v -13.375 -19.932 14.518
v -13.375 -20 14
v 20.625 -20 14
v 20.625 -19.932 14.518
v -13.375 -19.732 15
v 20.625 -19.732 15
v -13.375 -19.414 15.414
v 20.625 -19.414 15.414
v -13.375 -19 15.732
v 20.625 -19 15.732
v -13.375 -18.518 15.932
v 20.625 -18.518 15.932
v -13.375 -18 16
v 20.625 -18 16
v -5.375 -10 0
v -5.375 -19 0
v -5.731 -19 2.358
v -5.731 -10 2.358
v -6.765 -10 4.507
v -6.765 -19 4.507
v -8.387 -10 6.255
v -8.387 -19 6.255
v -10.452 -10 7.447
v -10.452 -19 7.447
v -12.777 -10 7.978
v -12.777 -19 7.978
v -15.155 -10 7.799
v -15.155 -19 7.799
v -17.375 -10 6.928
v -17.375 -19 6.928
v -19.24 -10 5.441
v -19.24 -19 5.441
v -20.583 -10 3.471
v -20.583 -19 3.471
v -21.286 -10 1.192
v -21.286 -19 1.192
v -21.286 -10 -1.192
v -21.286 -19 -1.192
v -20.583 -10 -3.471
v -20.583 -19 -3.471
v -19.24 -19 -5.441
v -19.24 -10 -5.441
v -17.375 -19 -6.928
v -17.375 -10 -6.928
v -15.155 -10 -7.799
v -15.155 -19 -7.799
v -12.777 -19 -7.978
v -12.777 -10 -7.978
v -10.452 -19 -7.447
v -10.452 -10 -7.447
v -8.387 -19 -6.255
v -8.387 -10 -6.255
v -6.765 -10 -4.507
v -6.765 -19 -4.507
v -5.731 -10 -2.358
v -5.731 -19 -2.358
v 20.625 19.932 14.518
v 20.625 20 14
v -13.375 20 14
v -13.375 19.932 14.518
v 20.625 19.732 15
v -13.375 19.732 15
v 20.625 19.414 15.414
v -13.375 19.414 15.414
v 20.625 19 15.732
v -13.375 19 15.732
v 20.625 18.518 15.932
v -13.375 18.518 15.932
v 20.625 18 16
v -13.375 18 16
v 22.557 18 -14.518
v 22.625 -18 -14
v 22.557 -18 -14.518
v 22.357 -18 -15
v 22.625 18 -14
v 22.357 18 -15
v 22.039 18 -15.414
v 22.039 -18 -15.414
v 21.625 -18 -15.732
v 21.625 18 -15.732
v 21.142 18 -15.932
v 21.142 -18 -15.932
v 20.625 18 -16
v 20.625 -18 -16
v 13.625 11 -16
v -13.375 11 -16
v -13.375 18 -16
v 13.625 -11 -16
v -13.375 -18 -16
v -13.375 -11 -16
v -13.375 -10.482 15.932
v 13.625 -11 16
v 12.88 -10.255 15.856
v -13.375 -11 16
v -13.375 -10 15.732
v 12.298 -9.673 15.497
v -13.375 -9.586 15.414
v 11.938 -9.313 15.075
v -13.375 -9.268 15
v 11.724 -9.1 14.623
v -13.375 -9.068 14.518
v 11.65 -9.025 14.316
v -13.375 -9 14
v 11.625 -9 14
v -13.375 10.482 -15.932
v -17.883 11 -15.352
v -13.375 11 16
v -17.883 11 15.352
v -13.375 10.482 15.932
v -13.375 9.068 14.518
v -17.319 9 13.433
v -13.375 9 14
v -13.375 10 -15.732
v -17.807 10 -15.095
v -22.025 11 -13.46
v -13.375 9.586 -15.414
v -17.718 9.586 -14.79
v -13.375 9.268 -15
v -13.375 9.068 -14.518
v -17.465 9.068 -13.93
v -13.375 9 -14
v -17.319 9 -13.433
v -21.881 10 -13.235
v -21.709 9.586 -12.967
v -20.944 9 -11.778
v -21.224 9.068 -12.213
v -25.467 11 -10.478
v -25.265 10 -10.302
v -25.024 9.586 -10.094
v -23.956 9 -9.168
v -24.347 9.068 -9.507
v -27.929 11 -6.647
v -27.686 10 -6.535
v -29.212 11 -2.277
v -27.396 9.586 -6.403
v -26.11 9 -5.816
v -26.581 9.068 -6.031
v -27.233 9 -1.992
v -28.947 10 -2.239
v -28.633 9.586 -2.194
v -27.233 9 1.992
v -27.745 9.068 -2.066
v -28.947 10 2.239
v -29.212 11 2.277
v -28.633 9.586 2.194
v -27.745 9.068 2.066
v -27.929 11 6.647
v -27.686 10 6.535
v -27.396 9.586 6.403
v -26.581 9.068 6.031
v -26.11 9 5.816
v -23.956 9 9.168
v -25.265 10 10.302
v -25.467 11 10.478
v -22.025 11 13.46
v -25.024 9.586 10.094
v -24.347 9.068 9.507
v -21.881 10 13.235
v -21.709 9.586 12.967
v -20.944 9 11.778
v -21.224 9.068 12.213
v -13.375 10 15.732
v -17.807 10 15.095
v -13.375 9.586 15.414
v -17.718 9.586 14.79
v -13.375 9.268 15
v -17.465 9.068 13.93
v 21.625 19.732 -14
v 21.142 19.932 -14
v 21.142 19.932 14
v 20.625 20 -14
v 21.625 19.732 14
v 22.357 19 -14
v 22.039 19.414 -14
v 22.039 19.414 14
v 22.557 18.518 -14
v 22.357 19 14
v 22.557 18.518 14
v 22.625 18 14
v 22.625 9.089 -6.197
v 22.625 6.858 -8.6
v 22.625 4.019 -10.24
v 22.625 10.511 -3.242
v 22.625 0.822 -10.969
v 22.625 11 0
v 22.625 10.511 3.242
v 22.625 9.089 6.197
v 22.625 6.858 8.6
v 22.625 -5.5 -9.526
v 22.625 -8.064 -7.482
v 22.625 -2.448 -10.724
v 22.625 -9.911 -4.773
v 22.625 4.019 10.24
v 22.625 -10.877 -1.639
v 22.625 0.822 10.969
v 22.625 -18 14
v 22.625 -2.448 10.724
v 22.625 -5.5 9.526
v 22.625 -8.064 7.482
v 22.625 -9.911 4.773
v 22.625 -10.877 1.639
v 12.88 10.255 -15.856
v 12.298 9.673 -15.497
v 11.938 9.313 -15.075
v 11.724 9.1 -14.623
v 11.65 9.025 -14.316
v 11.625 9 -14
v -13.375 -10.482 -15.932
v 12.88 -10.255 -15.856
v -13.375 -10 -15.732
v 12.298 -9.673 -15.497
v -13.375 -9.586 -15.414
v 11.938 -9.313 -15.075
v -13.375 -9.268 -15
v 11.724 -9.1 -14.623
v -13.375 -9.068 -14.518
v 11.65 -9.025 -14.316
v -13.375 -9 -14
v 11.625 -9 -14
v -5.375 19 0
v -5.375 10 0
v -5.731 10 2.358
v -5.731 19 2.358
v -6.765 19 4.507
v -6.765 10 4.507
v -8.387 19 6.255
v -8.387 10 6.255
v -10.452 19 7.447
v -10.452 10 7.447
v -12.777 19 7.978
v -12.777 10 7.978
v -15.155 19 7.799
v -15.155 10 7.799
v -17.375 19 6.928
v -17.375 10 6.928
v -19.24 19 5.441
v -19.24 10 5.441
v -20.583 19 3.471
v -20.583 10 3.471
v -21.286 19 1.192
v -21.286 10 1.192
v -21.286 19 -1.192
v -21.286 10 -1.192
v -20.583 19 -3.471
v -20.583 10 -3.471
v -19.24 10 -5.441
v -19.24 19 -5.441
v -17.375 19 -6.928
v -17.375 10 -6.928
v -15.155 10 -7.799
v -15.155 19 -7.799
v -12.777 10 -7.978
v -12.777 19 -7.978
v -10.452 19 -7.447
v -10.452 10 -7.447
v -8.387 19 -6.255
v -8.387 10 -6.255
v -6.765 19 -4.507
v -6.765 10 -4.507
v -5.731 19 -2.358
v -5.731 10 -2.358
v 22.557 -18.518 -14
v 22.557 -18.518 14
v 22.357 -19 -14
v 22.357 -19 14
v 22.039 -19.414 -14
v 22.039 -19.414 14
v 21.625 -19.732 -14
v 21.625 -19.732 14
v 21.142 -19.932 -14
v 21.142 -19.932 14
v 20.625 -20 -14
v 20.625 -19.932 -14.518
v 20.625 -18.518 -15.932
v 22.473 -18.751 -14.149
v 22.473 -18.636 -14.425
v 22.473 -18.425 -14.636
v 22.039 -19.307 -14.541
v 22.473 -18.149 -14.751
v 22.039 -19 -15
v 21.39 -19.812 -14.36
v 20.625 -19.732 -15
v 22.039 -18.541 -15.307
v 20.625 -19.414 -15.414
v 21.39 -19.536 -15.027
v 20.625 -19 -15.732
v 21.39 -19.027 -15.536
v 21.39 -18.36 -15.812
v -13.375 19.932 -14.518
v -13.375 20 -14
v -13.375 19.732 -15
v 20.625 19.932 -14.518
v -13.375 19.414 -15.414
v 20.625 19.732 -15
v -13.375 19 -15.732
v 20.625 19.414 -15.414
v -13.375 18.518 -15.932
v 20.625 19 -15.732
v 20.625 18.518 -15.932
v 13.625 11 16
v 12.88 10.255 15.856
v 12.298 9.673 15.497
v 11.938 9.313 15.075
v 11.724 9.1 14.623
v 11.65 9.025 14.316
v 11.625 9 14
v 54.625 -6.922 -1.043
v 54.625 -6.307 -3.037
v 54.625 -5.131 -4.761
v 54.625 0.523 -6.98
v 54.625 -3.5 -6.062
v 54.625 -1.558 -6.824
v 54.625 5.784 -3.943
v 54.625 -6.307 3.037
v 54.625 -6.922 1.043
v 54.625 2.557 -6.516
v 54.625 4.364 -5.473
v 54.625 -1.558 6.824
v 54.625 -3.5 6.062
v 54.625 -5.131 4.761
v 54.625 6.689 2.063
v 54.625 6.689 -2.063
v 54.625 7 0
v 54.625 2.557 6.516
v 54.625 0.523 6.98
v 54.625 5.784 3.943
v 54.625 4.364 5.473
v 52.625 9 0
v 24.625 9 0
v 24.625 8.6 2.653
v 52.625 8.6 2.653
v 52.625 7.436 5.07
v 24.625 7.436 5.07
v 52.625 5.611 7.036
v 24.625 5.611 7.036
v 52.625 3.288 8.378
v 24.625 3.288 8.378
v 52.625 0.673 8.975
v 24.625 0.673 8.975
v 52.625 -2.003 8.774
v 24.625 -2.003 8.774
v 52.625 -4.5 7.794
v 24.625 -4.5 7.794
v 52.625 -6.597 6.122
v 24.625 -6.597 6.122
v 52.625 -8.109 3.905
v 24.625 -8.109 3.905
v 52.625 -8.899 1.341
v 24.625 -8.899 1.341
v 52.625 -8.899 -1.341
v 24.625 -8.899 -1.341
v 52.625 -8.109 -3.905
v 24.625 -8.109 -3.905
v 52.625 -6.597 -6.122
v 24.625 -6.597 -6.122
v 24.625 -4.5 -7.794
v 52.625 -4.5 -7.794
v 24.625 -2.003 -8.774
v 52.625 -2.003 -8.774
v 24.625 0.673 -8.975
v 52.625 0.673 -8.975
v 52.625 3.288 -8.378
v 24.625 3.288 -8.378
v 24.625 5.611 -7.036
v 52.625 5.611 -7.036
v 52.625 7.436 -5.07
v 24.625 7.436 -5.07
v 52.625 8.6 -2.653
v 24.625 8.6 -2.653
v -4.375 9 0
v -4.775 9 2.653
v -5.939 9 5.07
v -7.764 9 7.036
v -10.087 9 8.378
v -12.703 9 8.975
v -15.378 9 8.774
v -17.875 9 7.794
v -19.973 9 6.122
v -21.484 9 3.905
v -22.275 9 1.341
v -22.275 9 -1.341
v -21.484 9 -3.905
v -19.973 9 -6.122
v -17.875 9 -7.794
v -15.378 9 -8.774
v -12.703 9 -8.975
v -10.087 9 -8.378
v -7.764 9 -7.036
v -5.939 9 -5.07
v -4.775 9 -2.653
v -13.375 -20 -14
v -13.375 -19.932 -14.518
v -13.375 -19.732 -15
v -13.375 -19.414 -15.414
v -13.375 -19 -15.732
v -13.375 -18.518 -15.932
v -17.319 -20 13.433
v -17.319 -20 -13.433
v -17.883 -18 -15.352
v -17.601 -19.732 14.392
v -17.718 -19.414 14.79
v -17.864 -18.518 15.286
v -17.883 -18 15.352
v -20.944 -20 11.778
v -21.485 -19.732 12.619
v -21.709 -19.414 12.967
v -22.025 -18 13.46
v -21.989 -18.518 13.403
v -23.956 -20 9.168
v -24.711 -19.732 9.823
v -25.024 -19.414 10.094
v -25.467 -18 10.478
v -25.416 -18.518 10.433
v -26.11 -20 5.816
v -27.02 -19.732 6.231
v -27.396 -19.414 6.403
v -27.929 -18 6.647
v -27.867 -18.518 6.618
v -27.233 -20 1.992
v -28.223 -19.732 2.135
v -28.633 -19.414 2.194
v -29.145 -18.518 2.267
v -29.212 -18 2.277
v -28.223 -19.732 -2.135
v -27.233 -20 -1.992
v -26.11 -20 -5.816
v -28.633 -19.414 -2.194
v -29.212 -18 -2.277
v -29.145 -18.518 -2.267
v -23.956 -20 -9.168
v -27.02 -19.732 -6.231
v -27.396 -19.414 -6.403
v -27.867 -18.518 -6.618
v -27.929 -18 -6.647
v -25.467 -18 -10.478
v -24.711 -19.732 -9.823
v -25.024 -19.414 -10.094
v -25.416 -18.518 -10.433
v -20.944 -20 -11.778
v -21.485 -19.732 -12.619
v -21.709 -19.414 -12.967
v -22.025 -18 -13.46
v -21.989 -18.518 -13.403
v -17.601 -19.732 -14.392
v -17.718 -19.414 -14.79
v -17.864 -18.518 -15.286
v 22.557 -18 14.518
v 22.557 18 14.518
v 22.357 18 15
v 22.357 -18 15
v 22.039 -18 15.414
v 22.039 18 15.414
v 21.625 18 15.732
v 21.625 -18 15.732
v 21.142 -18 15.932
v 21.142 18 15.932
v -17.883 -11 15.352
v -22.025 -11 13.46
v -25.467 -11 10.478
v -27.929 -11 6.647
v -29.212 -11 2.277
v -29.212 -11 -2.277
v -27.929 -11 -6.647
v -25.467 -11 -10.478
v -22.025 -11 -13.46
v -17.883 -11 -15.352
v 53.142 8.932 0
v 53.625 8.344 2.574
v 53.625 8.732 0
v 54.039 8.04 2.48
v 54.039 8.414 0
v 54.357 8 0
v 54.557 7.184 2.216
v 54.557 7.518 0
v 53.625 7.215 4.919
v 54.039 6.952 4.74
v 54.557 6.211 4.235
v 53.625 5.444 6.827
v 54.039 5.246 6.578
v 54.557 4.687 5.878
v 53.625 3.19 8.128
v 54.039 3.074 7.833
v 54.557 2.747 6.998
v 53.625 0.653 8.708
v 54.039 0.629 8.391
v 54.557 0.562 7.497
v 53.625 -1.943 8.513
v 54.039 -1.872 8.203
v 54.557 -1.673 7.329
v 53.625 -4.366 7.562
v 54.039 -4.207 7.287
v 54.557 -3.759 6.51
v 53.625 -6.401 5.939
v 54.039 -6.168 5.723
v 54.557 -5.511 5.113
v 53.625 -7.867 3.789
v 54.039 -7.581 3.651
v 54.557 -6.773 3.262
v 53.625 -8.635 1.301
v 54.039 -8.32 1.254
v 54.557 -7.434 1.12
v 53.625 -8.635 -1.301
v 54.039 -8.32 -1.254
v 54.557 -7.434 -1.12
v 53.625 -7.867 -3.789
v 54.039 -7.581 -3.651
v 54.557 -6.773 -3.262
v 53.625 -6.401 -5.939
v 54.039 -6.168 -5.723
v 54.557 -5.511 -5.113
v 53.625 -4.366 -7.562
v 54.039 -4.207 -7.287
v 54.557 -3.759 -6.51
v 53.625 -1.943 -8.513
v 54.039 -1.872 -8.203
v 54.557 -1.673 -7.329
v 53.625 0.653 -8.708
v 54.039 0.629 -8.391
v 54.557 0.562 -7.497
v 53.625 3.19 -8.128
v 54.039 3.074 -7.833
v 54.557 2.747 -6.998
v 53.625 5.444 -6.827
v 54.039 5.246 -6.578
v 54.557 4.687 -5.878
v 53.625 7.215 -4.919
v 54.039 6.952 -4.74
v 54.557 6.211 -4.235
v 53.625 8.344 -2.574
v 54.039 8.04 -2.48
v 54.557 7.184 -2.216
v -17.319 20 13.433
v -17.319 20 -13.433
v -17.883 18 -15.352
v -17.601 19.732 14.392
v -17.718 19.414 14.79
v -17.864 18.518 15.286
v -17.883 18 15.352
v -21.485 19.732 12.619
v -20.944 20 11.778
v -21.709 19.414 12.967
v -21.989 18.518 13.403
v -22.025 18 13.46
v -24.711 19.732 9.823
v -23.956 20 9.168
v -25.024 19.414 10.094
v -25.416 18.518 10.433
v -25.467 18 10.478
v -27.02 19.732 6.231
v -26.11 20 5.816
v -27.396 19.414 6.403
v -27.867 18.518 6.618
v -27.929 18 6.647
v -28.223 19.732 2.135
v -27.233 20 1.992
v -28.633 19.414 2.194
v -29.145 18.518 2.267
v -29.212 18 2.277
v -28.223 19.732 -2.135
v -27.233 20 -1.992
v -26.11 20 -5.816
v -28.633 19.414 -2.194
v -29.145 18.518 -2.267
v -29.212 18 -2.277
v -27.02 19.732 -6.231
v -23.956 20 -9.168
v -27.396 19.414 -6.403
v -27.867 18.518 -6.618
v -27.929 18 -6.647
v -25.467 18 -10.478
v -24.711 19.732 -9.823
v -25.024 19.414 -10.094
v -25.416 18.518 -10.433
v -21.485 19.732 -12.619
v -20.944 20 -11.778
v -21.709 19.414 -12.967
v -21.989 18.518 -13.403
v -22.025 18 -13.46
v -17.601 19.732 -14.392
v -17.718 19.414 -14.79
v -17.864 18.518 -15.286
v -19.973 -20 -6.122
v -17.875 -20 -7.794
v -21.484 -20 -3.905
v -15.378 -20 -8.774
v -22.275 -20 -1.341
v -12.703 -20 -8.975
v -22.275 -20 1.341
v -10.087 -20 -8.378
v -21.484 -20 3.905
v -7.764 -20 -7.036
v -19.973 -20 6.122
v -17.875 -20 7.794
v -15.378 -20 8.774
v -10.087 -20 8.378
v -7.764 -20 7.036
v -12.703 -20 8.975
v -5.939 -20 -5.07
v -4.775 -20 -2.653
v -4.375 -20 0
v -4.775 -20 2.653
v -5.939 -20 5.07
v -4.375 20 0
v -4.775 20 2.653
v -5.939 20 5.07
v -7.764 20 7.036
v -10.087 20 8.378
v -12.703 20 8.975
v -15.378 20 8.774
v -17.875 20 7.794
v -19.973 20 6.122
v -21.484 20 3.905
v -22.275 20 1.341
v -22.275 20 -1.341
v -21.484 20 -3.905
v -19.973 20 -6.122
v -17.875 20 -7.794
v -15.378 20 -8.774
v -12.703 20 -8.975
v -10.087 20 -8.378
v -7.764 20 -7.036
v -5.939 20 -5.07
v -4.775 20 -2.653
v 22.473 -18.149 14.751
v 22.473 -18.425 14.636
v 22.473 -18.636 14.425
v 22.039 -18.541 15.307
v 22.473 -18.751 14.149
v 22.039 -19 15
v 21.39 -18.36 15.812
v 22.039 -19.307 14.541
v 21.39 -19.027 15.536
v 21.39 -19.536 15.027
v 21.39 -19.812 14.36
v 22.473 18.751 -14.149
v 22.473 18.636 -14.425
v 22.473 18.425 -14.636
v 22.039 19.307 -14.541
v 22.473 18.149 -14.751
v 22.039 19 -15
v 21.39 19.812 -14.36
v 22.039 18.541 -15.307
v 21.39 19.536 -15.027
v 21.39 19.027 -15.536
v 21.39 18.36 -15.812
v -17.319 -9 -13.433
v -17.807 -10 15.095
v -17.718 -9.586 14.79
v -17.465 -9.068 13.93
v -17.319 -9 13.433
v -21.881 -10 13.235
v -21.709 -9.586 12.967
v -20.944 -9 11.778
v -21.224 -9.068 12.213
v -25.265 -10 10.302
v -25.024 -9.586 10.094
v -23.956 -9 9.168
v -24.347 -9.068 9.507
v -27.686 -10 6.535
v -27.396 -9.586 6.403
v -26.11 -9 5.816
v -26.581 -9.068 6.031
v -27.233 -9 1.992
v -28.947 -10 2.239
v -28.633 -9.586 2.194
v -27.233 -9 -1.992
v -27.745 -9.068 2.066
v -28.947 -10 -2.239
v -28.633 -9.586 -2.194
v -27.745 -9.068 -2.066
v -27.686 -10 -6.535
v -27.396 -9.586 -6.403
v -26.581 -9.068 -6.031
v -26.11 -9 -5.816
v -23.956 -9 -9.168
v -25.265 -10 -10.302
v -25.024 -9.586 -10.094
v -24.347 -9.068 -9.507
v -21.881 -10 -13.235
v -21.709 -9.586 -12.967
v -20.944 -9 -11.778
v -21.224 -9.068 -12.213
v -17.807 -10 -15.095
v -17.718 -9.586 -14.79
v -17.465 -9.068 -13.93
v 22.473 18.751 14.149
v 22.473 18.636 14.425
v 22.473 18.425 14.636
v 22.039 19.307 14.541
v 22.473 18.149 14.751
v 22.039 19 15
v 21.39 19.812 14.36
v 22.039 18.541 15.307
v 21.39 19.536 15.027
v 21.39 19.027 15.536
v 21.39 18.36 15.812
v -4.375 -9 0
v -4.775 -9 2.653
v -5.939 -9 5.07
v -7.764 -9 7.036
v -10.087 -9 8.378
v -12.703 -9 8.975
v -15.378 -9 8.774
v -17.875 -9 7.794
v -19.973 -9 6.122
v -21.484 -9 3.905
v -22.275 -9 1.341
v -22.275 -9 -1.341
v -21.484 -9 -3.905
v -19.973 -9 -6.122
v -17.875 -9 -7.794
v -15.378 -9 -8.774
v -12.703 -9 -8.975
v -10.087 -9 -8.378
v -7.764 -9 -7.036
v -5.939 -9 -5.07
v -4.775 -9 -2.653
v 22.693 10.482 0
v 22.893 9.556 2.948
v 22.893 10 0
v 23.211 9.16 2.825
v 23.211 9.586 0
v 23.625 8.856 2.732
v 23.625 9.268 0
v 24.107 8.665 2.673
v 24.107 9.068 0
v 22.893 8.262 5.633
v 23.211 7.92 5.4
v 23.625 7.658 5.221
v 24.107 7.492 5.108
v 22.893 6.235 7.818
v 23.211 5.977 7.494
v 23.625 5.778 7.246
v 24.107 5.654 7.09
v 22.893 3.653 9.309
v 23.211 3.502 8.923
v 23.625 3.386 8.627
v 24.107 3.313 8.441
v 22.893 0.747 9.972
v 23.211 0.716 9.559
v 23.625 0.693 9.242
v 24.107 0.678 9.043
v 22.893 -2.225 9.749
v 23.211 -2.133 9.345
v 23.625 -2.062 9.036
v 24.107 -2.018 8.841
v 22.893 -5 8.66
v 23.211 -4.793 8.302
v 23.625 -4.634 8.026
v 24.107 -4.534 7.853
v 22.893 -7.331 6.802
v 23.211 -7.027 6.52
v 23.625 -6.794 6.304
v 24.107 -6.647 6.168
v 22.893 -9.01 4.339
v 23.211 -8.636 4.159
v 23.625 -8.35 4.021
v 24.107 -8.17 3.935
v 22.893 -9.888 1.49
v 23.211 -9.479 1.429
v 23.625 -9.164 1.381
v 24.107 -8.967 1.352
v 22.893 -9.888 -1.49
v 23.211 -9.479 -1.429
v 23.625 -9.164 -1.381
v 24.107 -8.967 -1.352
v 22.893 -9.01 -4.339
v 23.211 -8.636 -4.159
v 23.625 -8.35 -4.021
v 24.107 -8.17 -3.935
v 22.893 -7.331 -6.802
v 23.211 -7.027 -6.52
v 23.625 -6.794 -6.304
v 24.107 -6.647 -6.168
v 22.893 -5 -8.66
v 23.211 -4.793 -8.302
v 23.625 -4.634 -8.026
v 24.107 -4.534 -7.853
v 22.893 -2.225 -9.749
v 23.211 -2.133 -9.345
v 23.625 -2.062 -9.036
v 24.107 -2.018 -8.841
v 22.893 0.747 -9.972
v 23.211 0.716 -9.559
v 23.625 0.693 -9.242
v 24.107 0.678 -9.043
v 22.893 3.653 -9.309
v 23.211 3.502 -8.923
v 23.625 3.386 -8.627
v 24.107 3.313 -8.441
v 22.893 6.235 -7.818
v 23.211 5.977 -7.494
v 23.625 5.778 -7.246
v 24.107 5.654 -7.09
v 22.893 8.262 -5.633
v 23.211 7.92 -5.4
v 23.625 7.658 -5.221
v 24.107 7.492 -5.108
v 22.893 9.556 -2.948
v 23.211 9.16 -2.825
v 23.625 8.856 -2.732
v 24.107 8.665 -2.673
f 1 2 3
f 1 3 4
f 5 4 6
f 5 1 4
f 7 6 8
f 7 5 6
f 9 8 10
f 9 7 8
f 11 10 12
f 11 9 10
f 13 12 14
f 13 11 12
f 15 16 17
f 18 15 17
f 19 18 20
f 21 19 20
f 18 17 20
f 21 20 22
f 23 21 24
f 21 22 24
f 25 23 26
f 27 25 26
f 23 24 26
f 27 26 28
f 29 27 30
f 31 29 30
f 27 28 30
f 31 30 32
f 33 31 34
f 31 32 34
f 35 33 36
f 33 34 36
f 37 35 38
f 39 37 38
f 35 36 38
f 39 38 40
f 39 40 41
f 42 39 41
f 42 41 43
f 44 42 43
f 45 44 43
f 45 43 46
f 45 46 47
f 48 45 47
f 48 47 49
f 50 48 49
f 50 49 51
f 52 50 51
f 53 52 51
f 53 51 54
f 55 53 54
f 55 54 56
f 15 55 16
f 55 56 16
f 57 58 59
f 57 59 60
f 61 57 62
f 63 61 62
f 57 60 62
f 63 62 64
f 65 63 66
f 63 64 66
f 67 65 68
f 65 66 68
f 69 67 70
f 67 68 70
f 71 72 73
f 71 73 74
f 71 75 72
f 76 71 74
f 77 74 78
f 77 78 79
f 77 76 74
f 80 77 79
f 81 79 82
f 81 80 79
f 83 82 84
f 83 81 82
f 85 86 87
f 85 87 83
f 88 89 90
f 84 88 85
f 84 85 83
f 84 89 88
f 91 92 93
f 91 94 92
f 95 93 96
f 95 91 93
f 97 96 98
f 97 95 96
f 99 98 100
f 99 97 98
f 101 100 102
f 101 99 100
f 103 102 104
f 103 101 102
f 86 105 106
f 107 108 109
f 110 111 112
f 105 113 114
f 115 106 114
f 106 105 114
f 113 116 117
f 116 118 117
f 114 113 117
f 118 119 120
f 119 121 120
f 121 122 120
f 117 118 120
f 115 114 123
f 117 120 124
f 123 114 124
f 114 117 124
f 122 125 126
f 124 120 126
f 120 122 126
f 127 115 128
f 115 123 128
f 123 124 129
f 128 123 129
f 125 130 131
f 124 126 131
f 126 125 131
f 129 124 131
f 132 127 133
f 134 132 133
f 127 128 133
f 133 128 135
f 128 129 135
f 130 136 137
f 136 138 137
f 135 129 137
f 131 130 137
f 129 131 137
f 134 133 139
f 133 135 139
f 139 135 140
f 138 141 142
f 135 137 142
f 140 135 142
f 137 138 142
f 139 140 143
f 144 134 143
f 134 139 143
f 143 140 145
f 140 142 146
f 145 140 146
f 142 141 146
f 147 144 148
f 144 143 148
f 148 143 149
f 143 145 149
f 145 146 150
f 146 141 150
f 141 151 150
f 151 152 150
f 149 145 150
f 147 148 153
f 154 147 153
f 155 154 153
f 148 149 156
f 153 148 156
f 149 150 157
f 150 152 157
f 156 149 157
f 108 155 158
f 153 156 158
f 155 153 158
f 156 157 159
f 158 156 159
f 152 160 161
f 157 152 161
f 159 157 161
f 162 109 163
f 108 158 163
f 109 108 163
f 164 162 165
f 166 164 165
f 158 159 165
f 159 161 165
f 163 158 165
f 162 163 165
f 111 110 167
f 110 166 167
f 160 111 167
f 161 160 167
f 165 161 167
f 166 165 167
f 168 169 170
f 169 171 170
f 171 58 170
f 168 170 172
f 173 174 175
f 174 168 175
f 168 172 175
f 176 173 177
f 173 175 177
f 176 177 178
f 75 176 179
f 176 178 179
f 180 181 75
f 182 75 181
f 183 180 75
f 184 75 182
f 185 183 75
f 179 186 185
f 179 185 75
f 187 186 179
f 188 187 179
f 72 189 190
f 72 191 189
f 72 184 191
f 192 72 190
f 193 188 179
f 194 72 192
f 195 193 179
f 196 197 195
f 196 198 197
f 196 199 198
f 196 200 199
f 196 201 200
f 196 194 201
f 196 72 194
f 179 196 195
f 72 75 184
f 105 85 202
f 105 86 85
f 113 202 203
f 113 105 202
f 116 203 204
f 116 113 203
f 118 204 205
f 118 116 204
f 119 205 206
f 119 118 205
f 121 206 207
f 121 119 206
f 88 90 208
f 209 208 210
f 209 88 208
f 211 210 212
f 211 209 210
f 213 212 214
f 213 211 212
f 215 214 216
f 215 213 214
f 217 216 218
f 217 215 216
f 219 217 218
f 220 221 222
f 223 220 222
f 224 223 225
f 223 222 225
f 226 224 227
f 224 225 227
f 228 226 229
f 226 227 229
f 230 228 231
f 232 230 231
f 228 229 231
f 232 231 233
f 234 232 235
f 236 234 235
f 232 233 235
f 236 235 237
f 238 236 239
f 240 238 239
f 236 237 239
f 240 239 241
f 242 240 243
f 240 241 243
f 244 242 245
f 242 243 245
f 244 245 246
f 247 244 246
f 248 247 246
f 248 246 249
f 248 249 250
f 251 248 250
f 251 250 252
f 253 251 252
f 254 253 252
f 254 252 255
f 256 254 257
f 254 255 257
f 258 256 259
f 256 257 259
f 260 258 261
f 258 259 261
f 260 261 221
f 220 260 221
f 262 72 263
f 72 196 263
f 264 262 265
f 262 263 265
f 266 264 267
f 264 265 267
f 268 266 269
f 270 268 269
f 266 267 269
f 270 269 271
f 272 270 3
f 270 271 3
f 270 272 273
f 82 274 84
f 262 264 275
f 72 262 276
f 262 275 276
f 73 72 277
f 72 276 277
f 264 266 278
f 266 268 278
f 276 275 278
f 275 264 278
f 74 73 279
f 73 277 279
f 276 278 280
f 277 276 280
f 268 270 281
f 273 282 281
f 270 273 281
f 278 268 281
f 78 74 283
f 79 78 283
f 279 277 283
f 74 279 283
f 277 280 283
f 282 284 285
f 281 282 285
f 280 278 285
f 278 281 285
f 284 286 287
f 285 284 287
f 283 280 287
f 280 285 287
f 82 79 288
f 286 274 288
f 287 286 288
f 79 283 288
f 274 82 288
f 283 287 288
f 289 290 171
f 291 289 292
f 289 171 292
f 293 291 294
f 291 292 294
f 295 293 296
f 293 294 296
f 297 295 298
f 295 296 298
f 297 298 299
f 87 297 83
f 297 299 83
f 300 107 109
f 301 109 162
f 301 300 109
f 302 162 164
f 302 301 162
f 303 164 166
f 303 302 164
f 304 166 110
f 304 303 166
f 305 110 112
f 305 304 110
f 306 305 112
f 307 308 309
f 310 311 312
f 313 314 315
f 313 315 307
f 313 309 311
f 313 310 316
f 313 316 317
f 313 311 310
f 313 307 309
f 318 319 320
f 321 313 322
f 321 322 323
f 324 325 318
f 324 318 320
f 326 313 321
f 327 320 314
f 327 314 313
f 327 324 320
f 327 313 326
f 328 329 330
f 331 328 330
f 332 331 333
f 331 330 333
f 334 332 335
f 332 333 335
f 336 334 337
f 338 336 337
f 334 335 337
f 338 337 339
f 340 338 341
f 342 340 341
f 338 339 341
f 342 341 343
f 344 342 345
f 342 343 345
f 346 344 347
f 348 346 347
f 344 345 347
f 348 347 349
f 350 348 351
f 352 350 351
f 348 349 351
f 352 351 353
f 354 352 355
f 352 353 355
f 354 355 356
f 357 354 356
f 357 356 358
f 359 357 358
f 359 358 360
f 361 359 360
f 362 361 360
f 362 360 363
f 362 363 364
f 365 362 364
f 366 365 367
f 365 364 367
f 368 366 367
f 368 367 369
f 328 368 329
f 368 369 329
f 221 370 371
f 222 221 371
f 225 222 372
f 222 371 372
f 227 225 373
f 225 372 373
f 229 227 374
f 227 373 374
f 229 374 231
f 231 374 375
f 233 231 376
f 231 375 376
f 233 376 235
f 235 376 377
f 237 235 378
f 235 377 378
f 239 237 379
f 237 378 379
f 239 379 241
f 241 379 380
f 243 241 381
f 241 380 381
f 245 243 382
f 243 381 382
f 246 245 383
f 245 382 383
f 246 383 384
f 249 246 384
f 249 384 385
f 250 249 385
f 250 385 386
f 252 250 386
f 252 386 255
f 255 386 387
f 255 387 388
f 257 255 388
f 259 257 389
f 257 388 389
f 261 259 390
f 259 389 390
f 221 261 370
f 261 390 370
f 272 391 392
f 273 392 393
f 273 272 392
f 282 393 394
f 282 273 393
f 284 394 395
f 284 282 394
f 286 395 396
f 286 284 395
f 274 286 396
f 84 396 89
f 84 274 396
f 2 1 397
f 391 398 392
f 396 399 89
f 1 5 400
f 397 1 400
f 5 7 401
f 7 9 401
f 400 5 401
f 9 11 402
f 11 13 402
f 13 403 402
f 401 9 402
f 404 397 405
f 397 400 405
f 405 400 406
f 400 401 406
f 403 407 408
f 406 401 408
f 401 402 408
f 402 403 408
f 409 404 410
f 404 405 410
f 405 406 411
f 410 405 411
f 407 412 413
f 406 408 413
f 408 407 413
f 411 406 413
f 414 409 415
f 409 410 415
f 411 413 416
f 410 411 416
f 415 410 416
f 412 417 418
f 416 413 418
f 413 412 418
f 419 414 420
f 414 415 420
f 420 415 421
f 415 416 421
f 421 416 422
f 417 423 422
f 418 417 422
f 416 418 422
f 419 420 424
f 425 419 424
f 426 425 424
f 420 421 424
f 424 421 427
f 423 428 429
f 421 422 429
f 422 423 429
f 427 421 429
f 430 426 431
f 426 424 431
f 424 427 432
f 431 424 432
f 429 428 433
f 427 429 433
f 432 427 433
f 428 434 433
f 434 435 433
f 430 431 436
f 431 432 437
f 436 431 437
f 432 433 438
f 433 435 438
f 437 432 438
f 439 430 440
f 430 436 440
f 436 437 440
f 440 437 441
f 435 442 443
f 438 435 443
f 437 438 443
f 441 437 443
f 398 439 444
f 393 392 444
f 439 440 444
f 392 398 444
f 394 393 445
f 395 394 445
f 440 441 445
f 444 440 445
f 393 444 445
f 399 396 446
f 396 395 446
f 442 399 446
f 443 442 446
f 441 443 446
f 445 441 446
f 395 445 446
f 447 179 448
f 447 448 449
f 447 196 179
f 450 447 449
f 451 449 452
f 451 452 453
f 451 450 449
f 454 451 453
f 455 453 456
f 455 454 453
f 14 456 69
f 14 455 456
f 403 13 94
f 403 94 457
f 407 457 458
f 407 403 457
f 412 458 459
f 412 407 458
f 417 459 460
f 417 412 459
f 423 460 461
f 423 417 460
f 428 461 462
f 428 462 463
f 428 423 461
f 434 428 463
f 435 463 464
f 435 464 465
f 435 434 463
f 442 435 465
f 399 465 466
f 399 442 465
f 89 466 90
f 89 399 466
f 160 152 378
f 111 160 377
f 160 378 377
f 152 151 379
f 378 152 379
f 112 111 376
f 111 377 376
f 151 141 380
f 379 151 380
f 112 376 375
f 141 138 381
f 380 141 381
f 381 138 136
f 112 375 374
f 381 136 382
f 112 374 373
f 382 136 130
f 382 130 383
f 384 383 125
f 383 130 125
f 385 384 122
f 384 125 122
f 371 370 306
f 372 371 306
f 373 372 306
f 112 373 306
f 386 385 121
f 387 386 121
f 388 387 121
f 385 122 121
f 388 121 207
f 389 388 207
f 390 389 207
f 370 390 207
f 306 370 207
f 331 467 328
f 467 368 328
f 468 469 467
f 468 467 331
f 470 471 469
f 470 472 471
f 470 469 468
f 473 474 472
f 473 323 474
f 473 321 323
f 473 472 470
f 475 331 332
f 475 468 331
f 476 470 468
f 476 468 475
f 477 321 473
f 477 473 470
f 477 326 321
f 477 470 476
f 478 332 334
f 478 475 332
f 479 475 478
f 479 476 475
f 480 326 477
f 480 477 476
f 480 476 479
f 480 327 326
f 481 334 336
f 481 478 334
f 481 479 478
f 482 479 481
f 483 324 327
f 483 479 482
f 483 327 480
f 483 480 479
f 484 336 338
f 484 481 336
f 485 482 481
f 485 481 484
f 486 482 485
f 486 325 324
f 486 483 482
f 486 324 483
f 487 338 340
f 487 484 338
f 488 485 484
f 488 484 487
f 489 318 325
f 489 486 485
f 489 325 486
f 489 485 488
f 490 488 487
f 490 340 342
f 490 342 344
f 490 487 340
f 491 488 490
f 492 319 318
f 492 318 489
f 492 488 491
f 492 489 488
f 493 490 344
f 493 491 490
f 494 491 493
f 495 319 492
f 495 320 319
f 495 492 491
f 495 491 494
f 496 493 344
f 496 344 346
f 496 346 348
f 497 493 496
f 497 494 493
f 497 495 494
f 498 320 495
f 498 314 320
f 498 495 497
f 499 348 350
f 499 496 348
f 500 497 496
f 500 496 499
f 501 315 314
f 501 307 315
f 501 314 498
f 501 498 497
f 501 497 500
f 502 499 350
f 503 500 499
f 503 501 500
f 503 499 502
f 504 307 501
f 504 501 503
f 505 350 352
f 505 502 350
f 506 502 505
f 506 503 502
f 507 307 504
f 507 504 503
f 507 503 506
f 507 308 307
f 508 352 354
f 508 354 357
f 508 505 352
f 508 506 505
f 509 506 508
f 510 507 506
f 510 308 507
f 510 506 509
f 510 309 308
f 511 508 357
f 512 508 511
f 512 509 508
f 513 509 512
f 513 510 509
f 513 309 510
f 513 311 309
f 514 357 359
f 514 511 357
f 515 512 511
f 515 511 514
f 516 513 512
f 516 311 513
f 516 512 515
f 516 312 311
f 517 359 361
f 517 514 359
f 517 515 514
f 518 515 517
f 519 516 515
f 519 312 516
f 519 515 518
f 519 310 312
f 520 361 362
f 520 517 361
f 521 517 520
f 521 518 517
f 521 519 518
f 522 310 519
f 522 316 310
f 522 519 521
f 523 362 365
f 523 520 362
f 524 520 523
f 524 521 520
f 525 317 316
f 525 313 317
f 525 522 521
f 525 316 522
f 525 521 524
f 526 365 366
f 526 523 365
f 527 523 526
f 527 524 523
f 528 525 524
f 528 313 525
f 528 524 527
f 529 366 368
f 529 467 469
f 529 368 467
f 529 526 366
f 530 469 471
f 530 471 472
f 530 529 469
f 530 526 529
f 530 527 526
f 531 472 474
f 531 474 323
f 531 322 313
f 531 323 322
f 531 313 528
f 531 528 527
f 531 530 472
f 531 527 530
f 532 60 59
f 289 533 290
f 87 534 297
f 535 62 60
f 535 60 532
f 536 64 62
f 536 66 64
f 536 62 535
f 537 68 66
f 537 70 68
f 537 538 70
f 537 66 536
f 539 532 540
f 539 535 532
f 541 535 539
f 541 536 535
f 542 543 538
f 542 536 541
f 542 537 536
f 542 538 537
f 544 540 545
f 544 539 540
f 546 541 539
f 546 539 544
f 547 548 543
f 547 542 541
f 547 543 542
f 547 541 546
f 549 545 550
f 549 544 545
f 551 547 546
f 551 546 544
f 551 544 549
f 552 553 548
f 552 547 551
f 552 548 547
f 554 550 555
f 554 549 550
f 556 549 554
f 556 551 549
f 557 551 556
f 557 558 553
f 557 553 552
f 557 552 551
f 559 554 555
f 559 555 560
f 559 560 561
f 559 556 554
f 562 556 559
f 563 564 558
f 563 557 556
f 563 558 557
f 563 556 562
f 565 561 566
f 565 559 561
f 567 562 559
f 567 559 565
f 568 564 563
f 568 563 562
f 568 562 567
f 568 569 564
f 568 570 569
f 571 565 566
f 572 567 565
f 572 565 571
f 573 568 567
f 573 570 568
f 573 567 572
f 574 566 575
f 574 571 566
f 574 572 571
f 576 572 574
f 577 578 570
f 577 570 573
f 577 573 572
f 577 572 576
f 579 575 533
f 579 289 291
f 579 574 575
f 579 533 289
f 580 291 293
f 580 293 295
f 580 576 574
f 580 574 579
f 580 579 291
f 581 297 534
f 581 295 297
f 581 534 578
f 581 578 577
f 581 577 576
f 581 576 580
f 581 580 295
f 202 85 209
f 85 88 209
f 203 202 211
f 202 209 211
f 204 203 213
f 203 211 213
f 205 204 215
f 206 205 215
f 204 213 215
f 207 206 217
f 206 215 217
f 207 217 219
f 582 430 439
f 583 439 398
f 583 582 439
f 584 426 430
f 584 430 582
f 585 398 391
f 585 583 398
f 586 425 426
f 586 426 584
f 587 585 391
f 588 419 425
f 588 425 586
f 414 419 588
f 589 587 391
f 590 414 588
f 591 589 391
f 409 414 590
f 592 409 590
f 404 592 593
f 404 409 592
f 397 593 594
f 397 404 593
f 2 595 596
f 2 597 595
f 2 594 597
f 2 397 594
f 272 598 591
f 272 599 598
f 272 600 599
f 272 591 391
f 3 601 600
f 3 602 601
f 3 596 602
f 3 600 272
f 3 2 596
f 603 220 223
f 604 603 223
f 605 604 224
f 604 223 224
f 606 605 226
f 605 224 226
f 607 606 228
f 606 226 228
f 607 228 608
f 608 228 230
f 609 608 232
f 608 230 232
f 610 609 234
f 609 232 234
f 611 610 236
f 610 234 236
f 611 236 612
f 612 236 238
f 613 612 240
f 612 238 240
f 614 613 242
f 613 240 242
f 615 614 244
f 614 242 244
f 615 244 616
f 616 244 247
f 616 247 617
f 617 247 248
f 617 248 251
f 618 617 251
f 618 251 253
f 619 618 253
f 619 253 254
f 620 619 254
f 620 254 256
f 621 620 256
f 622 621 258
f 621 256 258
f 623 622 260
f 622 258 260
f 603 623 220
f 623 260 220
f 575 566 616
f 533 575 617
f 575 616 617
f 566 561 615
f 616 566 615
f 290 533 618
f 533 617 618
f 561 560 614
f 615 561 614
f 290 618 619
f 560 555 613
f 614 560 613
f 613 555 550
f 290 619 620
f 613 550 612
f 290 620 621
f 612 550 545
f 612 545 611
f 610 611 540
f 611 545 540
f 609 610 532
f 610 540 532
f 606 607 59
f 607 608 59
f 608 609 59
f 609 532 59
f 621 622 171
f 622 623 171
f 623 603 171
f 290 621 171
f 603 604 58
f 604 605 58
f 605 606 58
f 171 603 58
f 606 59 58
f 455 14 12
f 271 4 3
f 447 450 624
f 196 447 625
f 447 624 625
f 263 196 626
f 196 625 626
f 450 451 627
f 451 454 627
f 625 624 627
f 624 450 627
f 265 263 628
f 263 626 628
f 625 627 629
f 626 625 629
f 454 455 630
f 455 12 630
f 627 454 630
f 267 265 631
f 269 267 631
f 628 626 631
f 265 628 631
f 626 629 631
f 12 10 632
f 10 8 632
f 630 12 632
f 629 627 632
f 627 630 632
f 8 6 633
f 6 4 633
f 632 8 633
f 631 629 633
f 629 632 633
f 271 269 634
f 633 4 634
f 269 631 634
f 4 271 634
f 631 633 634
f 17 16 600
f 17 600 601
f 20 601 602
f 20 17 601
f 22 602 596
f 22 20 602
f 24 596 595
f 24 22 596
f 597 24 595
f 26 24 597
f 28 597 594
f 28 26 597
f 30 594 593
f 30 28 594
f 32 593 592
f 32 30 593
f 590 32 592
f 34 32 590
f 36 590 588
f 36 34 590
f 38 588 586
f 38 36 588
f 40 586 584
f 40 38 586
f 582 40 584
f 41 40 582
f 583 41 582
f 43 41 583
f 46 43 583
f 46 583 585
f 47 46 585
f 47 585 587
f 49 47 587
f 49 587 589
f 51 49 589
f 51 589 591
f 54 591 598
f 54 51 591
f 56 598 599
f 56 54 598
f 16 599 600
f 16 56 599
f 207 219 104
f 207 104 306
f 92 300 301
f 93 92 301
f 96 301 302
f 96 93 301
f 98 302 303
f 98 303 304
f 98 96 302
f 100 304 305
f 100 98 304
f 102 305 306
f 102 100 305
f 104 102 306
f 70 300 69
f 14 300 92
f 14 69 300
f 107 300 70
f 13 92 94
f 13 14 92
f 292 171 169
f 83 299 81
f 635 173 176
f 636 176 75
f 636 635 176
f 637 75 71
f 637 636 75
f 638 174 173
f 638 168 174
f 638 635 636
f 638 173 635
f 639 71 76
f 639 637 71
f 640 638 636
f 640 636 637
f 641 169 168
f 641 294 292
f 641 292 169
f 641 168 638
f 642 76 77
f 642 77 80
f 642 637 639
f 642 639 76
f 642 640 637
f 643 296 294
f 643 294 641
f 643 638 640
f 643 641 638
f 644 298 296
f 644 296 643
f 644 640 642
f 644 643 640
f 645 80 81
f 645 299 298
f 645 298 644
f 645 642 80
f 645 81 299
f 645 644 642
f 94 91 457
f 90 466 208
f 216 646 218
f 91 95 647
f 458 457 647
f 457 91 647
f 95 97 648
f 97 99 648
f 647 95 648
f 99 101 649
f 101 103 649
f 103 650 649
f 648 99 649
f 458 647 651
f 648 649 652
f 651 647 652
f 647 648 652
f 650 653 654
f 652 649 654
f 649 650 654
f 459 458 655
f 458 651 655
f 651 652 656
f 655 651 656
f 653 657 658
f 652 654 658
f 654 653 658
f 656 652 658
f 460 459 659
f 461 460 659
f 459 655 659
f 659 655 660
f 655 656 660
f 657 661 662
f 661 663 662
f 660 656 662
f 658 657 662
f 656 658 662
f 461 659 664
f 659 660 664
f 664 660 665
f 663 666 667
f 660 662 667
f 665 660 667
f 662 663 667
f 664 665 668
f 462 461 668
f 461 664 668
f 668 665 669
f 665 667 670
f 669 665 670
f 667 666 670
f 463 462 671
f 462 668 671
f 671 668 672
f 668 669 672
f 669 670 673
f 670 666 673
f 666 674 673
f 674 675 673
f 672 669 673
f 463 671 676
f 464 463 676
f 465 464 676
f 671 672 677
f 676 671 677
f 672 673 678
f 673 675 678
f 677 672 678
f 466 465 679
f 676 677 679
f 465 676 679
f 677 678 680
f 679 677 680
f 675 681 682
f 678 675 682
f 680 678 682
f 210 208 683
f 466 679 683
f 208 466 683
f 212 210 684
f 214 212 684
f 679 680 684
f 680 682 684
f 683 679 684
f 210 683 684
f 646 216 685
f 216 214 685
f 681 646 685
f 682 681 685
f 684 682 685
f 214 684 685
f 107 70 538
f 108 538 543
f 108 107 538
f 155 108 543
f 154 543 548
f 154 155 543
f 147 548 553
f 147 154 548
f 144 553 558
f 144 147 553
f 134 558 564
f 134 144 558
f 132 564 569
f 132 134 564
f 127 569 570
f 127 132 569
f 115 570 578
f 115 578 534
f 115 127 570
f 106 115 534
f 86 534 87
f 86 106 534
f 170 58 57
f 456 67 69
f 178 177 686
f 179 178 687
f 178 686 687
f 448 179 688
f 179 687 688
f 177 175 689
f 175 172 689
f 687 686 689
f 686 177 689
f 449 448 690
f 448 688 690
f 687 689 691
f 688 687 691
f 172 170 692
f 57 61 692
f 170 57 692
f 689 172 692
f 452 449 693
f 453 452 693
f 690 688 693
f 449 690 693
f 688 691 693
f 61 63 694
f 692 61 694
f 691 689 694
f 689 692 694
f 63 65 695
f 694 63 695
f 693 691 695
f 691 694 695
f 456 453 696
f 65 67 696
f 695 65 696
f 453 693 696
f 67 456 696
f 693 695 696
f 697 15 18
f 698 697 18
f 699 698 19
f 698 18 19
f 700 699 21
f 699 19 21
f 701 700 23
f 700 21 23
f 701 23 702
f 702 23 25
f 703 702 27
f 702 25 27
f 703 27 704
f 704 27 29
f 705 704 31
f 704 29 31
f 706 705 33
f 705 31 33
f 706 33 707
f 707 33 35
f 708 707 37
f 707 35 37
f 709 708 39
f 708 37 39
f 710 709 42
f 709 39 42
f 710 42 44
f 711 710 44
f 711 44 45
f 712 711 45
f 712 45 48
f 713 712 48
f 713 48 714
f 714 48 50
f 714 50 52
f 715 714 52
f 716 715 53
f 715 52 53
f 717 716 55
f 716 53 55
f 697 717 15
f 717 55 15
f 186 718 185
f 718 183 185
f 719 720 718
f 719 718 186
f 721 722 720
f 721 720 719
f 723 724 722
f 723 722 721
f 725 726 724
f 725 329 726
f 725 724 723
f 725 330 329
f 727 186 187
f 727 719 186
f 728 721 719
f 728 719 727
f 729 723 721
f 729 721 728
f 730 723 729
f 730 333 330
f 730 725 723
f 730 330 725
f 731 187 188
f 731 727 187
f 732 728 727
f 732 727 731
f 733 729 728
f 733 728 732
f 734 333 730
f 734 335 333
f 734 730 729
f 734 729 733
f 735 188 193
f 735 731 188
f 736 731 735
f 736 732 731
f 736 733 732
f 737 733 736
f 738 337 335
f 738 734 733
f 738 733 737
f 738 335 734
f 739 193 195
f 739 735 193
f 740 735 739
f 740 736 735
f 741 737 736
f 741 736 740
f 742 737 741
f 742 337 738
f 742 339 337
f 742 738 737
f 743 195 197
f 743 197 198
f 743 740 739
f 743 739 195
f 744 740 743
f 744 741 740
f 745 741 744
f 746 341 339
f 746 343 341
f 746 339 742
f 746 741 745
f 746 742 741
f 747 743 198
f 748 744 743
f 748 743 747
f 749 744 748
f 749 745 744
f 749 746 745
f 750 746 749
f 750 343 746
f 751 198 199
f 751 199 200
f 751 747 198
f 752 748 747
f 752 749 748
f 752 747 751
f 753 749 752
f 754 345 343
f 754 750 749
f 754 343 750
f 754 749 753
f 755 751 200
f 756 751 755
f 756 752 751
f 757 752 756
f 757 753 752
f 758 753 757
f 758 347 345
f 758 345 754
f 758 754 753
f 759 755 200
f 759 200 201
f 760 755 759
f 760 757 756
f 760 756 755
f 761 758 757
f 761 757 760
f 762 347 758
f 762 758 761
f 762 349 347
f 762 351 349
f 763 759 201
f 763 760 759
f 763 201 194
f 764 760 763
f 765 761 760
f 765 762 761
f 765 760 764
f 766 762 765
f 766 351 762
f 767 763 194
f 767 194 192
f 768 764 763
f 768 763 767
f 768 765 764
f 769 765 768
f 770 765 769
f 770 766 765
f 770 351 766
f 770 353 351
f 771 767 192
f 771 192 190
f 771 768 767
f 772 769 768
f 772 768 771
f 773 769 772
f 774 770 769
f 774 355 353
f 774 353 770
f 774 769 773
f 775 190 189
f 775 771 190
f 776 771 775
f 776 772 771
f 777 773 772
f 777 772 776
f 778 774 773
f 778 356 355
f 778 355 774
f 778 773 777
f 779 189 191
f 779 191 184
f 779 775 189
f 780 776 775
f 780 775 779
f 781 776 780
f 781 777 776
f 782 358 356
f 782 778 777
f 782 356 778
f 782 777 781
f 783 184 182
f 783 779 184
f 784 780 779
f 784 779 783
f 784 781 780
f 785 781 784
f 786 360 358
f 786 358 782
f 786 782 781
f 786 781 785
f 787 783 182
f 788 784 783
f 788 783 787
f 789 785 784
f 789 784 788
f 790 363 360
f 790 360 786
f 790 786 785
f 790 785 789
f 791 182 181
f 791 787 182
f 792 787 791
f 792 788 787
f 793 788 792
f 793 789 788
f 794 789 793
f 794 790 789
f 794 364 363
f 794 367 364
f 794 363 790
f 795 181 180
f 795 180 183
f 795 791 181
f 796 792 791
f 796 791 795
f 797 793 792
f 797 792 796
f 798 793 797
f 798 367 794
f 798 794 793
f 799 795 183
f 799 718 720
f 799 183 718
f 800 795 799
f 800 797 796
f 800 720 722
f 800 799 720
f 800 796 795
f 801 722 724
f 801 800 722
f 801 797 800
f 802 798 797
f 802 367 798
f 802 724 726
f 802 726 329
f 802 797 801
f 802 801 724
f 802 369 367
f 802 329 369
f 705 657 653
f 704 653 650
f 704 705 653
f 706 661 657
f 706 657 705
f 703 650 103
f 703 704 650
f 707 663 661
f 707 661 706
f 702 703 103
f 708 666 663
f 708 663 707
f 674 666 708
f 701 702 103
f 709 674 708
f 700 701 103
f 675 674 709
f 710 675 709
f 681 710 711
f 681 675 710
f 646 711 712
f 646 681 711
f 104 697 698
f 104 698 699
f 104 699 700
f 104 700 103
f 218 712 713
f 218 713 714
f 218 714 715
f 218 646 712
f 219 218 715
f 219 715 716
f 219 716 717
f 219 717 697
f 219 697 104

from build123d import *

# Parameters (mm, degrees)
F1_DEPTH      = 20
F1_DEPTH_BACK = 20
F2_R          = 8
F3_DEPTH      = 40.001
F4_W          = 62.5443432552
F4_H          = 18
F5_DEPTH      = 16.001
F5_DEPTH_BACK = 25
F6_R          = 9
F7_DEPTH      = 32
F8_SIZE       = 1
F9_R          = 2


with BuildPart() as f1:
    # F0 (on Front) → F1 (new body, two sides)
    with BuildSketch(Plane.XZ) as f1_sk:
        with BuildLine():
            Line((22.6247903556, -16), (22.6247903556, 16))
            Line((22.6247903556, 16), (-13.3752096444, 16))
            ThreePointArc((-13.3752096444, 16), (-29.3752096444, 0), (-13.3752096444, -16))
            Line((-13.3752096444, -16), (22.6247903556, -16))
        make_face()
    extrude(amount=F1_DEPTH)
    extrude(f1_sk.sketch, amount=-F1_DEPTH_BACK)

    # F2 (on face) → F3 (cut, through all)
    with BuildSketch(Plane.XZ.offset(20)):
        with Locations((-13.3752096444, 0)):
            Circle(F2_R)
    extrude(amount=-F3_DEPTH, mode=Mode.SUBTRACT)

    # F4 (on Top) → F5 (cut, two sides)
    with BuildSketch(Plane.XY) as f5_sk:
        with Locations((-19.647381272, 0)):
            Rectangle(F4_W, F4_H)
    extrude(amount=F5_DEPTH, mode=Mode.SUBTRACT)
    extrude(f5_sk.sketch, amount=-F5_DEPTH_BACK, mode=Mode.SUBTRACT)

    # F6 (on face) → F7 (join)
    with BuildSketch(Plane.YZ.offset(22.6247903556)):
        Circle(F6_R)
    extrude(amount=F7_DEPTH)

    # F8
    f8_edges = [f1.edges().sort_by_distance(p)[0] for p in [
        (-21.37521, -20, 0),
        (-21.37521, 20, 0),
        (-21.37521, -9, 0),
        (-21.37521, 9, 0),
    ]]
    chamfer(f8_edges, length=F8_SIZE)

    # F9
    f9_edges = [f1.edges().sort_by_distance(p)[0] for p in [
        (-29.37521, -20, 0),
        (-0.87521, -9, 16),
        (11.62479, 0, 16),
        (11.62479, 0, -16),
        (-0.87521, 9, -16),
        (-29.37521, 20, 0),
        (22.62479, 20, 0),
        (22.62479, 0, 16),
        (22.62479, -20, 0),
        (22.62479, 0, -16),
        (54.62479, -9, 0),
        (22.62479, -9, 0),
    ]]
    fillet(f9_edges, radius=F9_R)


solid = f1.part
